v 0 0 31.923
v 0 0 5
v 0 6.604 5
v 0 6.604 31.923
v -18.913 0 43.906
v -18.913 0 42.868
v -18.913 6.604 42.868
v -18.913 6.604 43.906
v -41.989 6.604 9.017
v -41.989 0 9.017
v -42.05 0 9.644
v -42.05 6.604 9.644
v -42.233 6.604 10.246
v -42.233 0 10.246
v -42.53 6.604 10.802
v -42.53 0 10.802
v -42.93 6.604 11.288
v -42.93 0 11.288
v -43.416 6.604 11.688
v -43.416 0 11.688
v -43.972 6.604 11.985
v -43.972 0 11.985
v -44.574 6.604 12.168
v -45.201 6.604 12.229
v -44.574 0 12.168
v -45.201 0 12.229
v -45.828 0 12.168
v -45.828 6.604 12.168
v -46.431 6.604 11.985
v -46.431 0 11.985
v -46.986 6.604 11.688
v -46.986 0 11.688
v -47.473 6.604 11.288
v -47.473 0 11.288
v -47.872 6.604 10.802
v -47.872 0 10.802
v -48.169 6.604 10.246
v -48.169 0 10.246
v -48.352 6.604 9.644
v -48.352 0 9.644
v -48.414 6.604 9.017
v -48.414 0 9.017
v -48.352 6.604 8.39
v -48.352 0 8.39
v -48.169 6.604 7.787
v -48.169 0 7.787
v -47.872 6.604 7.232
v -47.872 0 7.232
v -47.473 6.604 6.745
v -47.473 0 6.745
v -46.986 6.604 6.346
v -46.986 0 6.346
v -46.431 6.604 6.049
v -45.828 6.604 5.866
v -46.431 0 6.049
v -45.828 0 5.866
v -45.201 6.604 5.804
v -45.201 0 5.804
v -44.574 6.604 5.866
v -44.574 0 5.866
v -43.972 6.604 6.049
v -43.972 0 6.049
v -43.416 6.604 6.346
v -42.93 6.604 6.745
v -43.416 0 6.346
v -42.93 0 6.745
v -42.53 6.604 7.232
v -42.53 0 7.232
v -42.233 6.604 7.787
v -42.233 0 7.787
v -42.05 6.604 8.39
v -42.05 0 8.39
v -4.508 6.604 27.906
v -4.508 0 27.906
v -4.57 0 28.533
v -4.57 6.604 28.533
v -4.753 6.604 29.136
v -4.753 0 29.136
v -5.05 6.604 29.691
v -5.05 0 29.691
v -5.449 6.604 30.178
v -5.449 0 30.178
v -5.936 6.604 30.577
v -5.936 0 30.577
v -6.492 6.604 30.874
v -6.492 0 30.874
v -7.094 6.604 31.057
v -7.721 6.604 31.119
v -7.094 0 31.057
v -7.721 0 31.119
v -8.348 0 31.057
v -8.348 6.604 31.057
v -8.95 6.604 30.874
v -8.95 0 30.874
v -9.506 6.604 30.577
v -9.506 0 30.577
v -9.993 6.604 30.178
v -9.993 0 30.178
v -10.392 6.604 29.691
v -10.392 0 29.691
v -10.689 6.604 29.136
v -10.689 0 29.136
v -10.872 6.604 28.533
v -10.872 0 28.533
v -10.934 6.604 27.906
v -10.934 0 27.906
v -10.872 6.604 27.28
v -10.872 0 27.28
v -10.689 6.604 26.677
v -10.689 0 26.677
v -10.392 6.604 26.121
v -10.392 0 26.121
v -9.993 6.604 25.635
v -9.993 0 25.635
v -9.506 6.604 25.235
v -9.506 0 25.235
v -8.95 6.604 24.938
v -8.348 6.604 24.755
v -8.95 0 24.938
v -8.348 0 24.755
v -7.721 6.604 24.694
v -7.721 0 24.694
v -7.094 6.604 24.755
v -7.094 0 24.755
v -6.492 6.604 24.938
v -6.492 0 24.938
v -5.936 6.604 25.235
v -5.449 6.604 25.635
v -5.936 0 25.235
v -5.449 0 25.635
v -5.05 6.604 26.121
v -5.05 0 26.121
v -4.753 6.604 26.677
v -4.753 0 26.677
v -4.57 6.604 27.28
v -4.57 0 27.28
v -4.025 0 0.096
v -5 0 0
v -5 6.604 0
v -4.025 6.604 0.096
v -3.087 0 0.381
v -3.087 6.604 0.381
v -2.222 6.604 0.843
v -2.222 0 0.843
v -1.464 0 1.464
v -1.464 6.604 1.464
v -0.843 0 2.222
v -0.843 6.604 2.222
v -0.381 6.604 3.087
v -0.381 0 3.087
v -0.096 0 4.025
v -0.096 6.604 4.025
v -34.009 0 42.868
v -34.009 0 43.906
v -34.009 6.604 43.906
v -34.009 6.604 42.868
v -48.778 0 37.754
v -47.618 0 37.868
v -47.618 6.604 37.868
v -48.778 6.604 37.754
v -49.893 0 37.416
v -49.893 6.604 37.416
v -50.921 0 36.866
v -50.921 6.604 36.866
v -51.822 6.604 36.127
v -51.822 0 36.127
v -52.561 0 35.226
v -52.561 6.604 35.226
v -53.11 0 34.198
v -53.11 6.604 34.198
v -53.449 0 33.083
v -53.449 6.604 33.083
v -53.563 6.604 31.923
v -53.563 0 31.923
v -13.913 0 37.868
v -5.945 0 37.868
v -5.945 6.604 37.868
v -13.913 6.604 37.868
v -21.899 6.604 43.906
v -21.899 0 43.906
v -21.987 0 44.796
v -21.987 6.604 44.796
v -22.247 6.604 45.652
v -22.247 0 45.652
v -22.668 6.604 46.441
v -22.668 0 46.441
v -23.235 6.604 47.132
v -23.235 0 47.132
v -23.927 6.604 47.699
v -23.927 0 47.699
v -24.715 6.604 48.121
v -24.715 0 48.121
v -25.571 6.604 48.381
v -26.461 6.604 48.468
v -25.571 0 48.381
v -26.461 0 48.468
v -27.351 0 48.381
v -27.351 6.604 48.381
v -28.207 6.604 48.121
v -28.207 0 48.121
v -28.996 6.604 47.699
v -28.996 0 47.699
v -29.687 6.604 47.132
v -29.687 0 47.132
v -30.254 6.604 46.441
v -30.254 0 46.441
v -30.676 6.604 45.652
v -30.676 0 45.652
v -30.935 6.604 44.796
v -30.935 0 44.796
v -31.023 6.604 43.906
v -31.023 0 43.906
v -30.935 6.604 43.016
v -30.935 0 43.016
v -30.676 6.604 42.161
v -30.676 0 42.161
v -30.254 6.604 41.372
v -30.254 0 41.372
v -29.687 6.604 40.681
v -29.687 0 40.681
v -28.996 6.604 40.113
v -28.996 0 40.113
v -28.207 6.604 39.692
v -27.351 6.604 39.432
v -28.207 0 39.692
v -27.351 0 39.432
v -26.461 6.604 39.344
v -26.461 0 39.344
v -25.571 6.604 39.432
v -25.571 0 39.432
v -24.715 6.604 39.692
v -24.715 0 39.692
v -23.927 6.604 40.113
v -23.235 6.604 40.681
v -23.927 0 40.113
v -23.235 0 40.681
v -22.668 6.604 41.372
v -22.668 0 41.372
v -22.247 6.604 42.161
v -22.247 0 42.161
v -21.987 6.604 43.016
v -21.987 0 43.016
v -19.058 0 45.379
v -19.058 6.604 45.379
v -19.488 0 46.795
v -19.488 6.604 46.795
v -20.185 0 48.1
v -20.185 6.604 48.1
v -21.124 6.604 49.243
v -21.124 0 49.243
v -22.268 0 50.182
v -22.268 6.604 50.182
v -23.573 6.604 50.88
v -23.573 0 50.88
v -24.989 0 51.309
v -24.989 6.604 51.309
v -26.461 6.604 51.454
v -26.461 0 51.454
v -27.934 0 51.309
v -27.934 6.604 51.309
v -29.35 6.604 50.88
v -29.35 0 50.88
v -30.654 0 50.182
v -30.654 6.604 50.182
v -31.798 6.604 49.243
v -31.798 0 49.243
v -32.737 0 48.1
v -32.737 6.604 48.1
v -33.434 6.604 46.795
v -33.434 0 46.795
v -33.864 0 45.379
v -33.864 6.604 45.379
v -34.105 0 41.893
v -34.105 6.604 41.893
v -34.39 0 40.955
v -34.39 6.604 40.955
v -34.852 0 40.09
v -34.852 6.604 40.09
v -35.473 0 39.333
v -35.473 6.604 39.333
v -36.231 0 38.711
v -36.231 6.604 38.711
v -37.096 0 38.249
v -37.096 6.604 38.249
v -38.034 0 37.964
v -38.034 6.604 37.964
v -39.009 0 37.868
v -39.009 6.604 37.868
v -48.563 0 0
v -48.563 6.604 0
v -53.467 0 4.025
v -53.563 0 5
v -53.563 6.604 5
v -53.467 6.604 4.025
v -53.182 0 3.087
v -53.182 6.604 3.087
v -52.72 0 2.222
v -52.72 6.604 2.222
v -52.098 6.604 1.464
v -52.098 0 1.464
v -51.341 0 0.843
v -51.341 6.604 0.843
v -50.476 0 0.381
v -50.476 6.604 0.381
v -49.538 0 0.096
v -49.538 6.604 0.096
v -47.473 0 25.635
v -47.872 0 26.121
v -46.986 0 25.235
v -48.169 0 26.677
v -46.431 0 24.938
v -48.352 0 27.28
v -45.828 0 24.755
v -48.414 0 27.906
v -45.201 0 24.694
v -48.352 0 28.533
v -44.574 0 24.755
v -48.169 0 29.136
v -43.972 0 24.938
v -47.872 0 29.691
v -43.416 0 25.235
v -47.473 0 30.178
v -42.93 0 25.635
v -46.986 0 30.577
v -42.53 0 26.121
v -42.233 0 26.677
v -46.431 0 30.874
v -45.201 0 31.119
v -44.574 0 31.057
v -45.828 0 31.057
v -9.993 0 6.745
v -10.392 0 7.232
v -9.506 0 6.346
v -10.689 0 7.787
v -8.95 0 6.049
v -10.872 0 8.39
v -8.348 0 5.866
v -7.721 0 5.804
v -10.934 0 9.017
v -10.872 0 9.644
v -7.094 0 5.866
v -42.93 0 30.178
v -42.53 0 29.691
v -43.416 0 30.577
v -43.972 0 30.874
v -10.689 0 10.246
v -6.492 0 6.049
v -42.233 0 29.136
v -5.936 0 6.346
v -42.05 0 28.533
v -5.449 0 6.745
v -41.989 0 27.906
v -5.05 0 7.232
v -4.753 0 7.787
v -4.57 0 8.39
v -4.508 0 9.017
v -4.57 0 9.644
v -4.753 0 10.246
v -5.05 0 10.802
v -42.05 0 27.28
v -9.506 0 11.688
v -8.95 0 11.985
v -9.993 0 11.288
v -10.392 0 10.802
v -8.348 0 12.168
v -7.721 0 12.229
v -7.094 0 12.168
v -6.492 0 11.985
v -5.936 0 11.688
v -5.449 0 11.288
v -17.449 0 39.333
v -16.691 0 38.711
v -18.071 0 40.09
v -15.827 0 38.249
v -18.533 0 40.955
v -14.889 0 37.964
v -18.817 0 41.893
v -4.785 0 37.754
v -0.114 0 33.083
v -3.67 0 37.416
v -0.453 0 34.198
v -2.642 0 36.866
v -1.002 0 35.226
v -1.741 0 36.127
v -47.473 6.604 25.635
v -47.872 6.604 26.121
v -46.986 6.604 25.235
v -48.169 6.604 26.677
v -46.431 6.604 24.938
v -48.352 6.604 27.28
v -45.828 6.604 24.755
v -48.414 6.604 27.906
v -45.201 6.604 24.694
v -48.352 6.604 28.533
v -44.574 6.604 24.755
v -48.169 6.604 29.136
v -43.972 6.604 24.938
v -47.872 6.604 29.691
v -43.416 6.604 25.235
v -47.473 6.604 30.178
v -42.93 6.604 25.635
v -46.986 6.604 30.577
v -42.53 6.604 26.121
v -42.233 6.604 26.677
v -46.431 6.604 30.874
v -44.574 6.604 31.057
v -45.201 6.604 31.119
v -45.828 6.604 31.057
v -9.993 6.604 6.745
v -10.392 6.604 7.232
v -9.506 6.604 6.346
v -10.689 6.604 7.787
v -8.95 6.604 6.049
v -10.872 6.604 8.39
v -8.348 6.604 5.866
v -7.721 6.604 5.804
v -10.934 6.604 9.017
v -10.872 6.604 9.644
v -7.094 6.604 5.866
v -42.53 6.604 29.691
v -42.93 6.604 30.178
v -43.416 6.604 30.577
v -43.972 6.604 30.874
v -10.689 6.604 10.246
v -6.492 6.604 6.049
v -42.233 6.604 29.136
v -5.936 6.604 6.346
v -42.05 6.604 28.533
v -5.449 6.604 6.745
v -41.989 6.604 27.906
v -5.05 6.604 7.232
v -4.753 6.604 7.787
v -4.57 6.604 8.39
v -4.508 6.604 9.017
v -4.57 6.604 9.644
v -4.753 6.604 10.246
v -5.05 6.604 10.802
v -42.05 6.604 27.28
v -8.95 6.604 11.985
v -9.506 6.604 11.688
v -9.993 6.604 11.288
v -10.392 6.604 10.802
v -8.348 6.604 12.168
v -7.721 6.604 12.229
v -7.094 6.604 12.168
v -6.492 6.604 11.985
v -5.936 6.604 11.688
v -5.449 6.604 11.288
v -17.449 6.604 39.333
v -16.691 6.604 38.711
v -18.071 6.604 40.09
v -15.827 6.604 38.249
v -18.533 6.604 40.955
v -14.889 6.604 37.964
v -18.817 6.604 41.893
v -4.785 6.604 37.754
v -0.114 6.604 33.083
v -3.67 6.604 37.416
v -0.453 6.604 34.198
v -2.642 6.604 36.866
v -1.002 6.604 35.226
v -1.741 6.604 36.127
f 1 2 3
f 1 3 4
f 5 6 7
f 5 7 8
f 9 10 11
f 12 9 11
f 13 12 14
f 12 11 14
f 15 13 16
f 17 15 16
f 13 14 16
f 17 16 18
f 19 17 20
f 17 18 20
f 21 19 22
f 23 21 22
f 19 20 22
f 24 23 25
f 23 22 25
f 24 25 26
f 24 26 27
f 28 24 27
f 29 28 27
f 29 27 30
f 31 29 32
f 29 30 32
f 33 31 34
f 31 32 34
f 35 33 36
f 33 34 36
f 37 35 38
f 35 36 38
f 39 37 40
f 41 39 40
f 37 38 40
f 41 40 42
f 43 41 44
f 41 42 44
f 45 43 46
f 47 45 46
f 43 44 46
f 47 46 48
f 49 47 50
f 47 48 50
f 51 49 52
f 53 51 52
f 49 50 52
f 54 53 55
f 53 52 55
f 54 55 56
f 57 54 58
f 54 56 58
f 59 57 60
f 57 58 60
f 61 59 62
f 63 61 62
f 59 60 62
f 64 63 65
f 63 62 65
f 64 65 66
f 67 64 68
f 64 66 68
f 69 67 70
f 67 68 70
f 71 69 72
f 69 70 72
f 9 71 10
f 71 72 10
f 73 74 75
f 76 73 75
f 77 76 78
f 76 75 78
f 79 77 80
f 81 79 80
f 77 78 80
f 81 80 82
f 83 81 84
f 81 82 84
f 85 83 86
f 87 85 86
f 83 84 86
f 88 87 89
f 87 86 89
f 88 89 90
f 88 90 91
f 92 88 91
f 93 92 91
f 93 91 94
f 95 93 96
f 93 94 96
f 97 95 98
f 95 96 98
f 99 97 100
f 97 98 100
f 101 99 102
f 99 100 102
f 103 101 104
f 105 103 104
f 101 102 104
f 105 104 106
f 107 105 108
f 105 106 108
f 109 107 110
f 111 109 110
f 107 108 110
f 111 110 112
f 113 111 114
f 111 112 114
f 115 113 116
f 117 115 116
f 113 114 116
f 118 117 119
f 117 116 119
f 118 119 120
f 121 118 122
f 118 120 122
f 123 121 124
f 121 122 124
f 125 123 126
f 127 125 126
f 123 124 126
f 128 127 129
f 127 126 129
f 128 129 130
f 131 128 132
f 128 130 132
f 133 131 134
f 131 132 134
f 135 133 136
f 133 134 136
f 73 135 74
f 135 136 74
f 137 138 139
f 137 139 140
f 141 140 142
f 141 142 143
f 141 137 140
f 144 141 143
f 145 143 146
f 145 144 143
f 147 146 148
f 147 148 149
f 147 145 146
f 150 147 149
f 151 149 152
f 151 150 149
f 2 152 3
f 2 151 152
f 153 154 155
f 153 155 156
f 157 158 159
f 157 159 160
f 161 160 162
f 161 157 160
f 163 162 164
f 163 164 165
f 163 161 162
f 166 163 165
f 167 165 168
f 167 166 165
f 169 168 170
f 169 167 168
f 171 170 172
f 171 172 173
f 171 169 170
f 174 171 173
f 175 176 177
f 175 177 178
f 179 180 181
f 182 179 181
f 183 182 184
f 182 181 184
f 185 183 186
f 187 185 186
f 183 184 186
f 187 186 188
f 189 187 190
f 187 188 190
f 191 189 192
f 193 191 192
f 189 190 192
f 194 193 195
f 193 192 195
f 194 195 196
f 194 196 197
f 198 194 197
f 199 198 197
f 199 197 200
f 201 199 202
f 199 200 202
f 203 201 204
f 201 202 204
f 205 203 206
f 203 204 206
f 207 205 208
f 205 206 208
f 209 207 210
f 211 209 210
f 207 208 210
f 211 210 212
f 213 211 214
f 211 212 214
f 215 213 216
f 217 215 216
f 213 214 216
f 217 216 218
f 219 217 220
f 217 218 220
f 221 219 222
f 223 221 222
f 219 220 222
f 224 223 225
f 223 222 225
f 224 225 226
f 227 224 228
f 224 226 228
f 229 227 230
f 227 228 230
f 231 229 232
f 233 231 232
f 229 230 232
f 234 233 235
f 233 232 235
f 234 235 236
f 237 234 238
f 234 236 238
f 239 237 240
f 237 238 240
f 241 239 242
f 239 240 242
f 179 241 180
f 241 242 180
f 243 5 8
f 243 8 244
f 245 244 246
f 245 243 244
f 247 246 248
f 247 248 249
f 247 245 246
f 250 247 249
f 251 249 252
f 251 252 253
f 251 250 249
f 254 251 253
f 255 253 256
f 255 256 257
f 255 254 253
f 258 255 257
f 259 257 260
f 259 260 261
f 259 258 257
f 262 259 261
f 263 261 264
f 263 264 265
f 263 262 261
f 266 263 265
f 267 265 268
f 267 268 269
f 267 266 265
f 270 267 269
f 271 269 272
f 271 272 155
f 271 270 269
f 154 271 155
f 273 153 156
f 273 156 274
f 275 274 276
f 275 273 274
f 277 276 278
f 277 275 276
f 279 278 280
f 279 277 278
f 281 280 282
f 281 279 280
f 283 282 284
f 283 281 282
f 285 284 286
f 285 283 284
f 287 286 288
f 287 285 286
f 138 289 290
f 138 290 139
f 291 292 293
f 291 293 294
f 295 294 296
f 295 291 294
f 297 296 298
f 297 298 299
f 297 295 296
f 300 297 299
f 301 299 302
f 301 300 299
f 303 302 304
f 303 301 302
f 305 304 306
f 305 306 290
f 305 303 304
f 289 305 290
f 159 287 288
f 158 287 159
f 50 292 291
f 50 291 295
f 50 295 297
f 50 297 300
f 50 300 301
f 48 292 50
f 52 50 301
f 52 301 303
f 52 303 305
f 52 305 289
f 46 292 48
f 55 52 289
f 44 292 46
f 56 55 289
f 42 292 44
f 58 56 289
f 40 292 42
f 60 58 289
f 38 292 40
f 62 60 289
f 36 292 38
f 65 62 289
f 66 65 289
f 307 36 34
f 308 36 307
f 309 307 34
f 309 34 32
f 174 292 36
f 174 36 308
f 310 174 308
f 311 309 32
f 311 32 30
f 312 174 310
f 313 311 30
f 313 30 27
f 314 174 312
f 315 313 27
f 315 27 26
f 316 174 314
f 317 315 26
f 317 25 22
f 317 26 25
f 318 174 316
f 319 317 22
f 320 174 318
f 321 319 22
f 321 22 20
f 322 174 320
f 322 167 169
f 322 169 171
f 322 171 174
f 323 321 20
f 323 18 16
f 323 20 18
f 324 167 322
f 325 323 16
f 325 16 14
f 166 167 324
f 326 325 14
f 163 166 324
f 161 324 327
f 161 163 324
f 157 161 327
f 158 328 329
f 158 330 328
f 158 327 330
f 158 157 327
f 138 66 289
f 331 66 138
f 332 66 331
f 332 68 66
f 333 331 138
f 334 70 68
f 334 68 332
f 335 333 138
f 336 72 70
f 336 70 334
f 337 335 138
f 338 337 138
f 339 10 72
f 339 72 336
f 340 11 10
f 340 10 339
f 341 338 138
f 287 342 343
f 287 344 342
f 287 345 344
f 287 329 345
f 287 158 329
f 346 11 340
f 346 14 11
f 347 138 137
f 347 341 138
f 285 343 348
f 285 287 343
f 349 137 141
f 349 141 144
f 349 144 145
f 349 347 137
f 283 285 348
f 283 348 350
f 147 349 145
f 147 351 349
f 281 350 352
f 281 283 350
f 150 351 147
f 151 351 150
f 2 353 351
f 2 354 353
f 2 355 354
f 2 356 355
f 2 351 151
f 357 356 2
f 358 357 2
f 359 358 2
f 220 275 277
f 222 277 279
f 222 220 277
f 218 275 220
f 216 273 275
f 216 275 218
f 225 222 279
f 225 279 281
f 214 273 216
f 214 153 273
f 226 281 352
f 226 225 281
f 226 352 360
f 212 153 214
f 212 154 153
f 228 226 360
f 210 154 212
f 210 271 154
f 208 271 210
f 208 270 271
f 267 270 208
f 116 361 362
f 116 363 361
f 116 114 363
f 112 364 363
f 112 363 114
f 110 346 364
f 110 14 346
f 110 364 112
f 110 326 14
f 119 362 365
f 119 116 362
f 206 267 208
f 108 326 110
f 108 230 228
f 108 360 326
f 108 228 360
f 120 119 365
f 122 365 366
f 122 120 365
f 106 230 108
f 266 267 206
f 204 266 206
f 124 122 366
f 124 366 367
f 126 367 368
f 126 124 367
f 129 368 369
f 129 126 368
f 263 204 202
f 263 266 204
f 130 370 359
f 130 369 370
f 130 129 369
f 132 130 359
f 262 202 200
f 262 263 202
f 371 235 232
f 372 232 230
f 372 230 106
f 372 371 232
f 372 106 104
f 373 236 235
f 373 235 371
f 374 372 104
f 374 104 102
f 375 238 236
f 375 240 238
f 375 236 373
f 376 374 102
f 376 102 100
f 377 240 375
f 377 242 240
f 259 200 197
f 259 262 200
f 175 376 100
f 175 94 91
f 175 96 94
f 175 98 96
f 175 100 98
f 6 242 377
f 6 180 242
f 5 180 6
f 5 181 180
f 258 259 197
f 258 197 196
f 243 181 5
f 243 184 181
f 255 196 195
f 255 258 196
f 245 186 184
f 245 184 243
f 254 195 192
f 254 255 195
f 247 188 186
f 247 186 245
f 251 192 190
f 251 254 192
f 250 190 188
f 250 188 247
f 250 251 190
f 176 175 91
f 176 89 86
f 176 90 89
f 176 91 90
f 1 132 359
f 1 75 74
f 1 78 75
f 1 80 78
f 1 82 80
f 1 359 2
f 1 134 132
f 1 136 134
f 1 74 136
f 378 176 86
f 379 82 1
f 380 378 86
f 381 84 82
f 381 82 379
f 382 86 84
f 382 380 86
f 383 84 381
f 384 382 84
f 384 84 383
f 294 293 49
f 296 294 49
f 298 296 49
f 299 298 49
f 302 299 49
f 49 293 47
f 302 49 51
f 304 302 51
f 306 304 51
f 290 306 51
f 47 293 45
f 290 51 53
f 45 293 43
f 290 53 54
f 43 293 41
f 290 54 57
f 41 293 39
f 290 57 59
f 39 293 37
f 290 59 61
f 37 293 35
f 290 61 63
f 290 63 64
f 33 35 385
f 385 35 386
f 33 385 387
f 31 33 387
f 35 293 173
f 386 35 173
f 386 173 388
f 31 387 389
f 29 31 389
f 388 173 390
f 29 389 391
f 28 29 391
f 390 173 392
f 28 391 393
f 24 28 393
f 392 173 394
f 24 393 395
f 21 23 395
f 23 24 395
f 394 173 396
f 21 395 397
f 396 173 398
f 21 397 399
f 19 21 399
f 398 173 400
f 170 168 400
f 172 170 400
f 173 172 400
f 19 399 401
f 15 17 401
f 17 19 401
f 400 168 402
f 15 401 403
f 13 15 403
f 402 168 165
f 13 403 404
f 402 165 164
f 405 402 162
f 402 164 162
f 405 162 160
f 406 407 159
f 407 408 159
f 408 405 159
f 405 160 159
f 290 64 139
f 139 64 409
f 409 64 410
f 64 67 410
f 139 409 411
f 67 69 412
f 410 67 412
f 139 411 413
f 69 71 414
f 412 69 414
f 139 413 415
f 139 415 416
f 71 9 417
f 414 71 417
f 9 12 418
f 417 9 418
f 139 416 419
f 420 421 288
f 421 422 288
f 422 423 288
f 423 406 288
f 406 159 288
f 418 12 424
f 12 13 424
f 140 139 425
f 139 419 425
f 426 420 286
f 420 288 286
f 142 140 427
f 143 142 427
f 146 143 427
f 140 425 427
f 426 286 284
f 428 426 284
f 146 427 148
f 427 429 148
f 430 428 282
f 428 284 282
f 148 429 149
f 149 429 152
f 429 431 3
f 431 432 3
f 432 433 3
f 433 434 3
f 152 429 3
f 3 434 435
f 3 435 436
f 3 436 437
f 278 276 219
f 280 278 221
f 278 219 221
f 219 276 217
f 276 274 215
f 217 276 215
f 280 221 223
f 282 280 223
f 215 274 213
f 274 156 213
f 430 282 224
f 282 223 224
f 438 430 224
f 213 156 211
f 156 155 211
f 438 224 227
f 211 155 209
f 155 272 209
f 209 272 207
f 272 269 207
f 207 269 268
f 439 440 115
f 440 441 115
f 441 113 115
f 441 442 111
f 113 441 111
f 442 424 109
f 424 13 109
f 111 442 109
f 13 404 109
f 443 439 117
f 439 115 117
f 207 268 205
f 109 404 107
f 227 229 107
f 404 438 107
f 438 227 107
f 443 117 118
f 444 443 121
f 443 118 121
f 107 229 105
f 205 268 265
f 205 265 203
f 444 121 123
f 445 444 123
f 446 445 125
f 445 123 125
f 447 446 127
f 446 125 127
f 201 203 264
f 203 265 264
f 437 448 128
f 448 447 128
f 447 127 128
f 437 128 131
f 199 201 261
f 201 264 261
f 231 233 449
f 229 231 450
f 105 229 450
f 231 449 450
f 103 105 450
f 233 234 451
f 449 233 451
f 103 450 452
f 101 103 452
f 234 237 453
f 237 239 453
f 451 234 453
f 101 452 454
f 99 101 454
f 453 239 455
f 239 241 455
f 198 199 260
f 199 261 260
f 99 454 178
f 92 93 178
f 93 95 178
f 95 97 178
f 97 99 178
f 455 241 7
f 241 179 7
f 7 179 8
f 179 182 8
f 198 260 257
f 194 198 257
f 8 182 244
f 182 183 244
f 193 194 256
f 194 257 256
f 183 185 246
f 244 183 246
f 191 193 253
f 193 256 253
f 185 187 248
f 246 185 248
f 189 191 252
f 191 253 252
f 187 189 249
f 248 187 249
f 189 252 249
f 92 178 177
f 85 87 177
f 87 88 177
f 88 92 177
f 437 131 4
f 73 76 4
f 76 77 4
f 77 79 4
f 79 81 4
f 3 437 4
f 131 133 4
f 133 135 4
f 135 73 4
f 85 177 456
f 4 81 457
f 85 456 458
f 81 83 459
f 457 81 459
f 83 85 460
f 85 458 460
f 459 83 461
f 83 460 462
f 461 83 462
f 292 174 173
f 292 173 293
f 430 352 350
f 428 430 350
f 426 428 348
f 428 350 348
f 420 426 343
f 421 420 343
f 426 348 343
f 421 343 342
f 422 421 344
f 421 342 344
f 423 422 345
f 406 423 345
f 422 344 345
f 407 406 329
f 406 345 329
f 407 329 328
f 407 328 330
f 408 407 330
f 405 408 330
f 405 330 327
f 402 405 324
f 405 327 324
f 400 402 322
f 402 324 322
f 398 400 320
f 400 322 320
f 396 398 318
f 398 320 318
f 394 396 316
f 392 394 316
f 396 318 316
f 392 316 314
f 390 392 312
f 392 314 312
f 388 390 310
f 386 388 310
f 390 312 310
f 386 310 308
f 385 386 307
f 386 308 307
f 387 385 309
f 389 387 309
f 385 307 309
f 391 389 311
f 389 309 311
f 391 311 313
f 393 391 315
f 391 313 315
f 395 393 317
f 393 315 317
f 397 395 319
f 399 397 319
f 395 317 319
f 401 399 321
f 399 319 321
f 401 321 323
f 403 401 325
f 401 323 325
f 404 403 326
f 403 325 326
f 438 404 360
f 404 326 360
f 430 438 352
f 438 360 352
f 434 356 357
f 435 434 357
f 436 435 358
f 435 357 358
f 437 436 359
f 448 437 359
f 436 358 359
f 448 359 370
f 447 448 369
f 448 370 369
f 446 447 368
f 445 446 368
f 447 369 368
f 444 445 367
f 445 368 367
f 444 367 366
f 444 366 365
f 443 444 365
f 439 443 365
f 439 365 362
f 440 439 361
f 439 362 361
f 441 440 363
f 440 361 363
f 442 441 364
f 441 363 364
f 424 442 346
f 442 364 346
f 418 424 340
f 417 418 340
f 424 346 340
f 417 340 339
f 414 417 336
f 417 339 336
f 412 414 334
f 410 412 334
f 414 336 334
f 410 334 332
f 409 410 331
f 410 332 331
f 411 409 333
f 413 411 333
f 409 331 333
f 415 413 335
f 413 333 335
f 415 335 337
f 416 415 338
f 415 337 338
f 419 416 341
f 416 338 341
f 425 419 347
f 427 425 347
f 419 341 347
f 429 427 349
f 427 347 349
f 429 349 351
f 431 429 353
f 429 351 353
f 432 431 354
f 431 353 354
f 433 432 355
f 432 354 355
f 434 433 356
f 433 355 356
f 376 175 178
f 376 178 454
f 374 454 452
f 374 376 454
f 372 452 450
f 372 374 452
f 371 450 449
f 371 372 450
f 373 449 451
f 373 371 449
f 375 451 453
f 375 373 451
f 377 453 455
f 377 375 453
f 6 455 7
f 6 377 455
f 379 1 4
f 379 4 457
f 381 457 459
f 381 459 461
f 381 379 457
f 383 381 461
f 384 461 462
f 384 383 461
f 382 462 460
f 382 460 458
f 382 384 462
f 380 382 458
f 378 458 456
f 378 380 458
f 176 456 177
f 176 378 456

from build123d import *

# Parameters (mm, degrees)
F0_R     = 3.212587
F0_R_2   = 4.561845
F1_DEPTH = 6.604


with BuildPart() as f1:
    # F0 (on Front) → F1 (new body)
    with BuildSketch(Plane.XZ):
        with BuildLine():
            Line((-48.562958, 0), (-5, 0))
            ThreePointArc((-5, 0), (-1.464466, 1.464466), (0, 5))
            Line((0, 5), (0, 31.923081))
            ThreePointArc((0, 31.923081), (-1.741241, 36.126808), (-5.944968, 37.868049))
            Line((-5.944968, 37.868049), (-13.91329, 37.868049))
            ThreePointArc((-13.91329, 37.868049), (-17.448823, 39.332515), (-18.91329, 42.868049))
            Line((-18.91329, 42.868049), (-18.91329, 43.906312))
            ThreePointArc((-18.91329, 43.906312), (-26.461123, 51.454146), (-34.008957, 43.906312))
            Line((-34.008957, 43.906312), (-34.008957, 42.868049))
            ThreePointArc((-34.008957, 42.868049), (-35.473424, 39.332515), (-39.008957, 37.868049))
            Line((-39.008957, 37.868049), (-47.61799, 37.868049))
            ThreePointArc((-47.61799, 37.868049), (-51.821717, 36.126808), (-53.562958, 31.923081))
            Line((-53.562958, 31.923081), (-53.562958, 5))
            ThreePointArc((-53.562958, 5), (-52.098492, 1.464466), (-48.562958, 0))
        make_face()
        with Locations((-45.20119, 9.01679)):
            Circle(F0_R, mode=Mode.SUBTRACT)
        with Locations((-7.721057, 9.01679)):
            Circle(F0_R, mode=Mode.SUBTRACT)
        with Locations((-45.20119, 27.906291)):
            Circle(F0_R, mode=Mode.SUBTRACT)
        with Locations((-7.721057, 27.906291)):
            Circle(F0_R, mode=Mode.SUBTRACT)
        with Locations((-26.461123, 43.906312)):
            Circle(F0_R_2, mode=Mode.SUBTRACT)
    extrude(amount=-F1_DEPTH)


solid = f1.part
